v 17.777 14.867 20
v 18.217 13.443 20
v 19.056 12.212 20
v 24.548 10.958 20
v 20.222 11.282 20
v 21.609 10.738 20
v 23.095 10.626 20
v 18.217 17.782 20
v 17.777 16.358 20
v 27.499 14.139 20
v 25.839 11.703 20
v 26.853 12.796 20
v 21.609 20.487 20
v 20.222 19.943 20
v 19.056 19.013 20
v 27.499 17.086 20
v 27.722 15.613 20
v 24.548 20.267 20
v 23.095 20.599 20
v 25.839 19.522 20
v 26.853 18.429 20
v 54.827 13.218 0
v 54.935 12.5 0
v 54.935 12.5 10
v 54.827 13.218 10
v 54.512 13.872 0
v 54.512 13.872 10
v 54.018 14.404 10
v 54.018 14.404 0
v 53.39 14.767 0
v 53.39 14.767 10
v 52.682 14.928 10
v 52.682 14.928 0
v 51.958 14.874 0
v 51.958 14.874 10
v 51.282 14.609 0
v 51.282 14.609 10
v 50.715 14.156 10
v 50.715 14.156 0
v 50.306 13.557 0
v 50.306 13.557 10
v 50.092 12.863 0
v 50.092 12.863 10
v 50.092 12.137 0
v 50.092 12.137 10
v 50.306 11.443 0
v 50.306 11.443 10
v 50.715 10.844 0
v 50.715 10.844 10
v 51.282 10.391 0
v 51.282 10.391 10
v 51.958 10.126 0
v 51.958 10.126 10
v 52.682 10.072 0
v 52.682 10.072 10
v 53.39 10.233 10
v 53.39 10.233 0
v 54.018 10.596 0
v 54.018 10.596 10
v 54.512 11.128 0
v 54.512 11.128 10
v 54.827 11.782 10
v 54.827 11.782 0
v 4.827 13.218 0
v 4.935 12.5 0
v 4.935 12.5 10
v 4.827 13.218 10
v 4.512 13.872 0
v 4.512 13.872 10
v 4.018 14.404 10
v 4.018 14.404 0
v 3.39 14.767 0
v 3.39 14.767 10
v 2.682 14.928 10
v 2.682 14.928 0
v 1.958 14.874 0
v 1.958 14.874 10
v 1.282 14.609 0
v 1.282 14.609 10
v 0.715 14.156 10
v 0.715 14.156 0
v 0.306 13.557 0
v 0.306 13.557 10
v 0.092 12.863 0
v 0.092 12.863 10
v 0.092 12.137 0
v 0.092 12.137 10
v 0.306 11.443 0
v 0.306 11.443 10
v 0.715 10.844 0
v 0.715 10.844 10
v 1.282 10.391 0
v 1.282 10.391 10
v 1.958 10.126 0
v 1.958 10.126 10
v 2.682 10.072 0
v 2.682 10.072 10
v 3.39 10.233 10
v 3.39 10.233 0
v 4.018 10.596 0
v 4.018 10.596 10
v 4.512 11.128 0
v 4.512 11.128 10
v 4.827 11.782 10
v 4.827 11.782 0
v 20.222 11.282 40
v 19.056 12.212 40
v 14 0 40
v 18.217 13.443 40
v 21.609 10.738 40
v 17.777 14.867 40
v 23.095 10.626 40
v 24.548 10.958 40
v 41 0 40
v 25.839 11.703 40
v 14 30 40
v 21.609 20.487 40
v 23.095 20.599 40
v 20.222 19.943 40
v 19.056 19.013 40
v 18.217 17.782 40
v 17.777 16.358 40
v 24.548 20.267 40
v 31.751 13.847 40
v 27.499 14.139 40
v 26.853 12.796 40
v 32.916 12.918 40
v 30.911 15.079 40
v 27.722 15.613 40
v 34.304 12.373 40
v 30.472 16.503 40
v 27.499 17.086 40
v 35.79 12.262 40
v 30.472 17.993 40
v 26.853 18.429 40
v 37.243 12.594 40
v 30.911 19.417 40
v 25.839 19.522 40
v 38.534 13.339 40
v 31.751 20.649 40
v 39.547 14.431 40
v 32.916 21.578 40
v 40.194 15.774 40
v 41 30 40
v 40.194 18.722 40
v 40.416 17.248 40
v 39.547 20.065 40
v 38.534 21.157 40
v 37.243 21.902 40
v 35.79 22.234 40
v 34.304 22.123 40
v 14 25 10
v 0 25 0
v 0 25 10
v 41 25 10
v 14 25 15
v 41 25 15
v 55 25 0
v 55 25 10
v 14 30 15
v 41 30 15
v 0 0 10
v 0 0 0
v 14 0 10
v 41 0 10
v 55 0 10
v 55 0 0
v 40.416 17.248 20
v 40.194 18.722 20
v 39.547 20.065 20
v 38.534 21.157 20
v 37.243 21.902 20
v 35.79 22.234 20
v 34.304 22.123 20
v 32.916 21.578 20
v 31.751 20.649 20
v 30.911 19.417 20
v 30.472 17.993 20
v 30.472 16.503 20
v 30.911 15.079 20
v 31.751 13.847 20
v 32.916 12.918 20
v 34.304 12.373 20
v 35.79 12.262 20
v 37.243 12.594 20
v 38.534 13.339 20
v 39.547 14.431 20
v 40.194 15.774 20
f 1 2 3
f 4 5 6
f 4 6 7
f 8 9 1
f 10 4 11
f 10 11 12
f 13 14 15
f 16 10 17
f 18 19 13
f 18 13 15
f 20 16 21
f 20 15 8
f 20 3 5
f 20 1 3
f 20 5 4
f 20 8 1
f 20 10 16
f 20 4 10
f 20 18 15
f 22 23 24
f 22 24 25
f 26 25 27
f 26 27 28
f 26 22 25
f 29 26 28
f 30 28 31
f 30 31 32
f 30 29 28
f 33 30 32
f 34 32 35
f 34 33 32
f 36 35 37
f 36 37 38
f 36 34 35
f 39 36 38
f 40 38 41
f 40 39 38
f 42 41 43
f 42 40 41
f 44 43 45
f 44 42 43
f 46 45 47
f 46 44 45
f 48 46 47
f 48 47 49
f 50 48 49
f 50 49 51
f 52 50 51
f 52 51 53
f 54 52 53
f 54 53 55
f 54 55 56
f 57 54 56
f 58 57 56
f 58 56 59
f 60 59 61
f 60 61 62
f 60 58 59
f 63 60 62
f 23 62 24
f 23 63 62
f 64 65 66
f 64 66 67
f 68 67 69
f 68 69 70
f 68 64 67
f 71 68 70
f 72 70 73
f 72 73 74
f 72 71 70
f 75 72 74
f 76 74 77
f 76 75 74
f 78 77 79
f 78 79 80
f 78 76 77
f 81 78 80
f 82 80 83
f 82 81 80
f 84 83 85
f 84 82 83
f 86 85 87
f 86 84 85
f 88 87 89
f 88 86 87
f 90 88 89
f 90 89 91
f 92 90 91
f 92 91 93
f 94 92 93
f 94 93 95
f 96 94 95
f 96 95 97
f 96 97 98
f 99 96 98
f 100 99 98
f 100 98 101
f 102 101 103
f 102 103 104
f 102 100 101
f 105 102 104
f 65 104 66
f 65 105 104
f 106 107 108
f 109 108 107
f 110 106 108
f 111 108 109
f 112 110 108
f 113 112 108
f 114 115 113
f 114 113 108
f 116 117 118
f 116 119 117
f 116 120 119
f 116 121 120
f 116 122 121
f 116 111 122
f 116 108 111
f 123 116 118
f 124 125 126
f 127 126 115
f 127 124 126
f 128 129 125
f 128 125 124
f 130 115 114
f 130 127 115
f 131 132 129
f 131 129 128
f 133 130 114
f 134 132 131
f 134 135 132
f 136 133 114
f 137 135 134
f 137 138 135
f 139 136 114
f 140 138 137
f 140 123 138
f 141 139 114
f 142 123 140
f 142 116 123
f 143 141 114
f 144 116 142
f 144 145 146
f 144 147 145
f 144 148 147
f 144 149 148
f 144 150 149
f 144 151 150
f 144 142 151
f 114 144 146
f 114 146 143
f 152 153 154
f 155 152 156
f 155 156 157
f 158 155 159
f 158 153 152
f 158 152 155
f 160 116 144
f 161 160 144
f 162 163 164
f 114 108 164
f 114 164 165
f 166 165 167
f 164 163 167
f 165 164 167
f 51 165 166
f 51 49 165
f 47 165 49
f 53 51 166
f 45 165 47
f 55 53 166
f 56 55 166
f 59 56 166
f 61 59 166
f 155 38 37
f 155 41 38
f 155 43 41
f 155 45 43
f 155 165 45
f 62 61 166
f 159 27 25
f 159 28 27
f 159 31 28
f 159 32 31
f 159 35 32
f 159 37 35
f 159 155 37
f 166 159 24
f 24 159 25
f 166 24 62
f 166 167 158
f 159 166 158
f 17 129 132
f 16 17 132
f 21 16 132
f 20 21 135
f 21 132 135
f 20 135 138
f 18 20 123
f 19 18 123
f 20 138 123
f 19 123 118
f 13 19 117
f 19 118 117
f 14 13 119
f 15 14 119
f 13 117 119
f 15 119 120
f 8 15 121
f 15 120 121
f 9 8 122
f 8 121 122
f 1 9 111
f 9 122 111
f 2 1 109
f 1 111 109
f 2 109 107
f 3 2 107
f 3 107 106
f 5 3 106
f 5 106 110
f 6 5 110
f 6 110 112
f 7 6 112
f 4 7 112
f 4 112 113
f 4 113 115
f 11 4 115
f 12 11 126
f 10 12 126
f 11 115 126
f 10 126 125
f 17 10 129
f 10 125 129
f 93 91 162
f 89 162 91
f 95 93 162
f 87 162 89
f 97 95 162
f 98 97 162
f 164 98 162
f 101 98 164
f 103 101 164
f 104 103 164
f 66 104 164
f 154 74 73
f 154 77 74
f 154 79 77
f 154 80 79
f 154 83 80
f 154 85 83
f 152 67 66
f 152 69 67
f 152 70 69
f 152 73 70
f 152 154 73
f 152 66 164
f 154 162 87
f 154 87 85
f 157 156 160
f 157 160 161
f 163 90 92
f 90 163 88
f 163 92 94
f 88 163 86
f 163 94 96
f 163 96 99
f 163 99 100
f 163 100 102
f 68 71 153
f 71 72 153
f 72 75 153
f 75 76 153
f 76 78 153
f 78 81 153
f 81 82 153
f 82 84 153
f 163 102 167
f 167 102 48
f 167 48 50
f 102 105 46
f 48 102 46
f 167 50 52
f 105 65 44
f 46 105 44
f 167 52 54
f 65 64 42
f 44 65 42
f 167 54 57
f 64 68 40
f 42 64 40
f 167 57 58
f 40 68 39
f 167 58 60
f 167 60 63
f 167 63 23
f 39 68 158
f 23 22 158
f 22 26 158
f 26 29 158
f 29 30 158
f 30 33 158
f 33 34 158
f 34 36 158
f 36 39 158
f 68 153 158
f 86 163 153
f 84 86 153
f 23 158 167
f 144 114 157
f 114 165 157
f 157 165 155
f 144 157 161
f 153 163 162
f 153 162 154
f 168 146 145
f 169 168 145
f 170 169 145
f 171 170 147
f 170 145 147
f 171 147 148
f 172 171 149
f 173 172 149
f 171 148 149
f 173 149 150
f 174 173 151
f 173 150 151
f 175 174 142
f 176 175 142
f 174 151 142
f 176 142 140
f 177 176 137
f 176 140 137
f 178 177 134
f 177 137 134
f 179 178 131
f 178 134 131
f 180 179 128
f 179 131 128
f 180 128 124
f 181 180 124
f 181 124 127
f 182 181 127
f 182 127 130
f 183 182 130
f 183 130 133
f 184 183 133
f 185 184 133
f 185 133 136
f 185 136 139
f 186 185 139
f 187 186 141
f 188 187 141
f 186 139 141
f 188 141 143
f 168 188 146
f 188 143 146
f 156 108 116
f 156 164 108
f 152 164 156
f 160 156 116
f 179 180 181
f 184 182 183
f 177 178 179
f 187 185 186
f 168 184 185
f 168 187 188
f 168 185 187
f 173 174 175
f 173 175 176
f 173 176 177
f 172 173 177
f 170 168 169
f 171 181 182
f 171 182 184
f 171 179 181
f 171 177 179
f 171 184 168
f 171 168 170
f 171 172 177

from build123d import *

# Parameters (mm, degrees)
SKETCH1_W           = 55
SKETCH1_H           = 25
SKETCH1_R           = 2.435064935
BOSS_EXTRUDE1_DEPTH = 10
SKETCH2_W           = 27
SKETCH2_H           = 25
BOSS_EXTRUDE2_DEPTH = 30
SKETCH3_W           = 27
SKETCH3_H           = 25
BOSS_EXTRUDE3_DEPTH = 30
SKETCH4_R           = 5
CUT_EXTRUDE1_DEPTH  = 20


with BuildPart() as part:
    # Sketch1 → Boss-Extrude1 (new body)
    with BuildSketch(Plane.XY):
        with Locations((27.5, 12.5)):
            Rectangle(SKETCH1_W, SKETCH1_H)
        with Locations((52.5, 12.5)):
            Circle(SKETCH1_R, mode=Mode.SUBTRACT)
        with Locations((2.5, 12.5)):
            Circle(SKETCH1_R, mode=Mode.SUBTRACT)
    extrude(amount=BOSS_EXTRUDE1_DEPTH)

    # Sketch2 → Boss-Extrude2 (add)
    with BuildSketch(Plane.XY.offset(10)):
        with Locations((27.5, 12.5)):
            Rectangle(SKETCH2_W, SKETCH2_H)
    extrude(amount=BOSS_EXTRUDE2_DEPTH)

    # Sketch3 → Boss-Extrude3 (add)
    with BuildSketch(Plane.XZ):
        with Locations((27.5, 27.5)):
            Rectangle(SKETCH3_W, SKETCH3_H)
    extrude(amount=-BOSS_EXTRUDE3_DEPTH)

    # Sketch4 → Cut-Extrude1 (cut)
    with BuildSketch(Plane.XY.offset(40)):
        with Locations((22.7215485, 15.612504219)):
            Circle(SKETCH4_R)
        with Locations((35.41615295, 17.248010158)):
            Circle(SKETCH4_R)
    extrude(amount=-CUT_EXTRUDE1_DEPTH, mode=Mode.SUBTRACT)


solid = part.part
